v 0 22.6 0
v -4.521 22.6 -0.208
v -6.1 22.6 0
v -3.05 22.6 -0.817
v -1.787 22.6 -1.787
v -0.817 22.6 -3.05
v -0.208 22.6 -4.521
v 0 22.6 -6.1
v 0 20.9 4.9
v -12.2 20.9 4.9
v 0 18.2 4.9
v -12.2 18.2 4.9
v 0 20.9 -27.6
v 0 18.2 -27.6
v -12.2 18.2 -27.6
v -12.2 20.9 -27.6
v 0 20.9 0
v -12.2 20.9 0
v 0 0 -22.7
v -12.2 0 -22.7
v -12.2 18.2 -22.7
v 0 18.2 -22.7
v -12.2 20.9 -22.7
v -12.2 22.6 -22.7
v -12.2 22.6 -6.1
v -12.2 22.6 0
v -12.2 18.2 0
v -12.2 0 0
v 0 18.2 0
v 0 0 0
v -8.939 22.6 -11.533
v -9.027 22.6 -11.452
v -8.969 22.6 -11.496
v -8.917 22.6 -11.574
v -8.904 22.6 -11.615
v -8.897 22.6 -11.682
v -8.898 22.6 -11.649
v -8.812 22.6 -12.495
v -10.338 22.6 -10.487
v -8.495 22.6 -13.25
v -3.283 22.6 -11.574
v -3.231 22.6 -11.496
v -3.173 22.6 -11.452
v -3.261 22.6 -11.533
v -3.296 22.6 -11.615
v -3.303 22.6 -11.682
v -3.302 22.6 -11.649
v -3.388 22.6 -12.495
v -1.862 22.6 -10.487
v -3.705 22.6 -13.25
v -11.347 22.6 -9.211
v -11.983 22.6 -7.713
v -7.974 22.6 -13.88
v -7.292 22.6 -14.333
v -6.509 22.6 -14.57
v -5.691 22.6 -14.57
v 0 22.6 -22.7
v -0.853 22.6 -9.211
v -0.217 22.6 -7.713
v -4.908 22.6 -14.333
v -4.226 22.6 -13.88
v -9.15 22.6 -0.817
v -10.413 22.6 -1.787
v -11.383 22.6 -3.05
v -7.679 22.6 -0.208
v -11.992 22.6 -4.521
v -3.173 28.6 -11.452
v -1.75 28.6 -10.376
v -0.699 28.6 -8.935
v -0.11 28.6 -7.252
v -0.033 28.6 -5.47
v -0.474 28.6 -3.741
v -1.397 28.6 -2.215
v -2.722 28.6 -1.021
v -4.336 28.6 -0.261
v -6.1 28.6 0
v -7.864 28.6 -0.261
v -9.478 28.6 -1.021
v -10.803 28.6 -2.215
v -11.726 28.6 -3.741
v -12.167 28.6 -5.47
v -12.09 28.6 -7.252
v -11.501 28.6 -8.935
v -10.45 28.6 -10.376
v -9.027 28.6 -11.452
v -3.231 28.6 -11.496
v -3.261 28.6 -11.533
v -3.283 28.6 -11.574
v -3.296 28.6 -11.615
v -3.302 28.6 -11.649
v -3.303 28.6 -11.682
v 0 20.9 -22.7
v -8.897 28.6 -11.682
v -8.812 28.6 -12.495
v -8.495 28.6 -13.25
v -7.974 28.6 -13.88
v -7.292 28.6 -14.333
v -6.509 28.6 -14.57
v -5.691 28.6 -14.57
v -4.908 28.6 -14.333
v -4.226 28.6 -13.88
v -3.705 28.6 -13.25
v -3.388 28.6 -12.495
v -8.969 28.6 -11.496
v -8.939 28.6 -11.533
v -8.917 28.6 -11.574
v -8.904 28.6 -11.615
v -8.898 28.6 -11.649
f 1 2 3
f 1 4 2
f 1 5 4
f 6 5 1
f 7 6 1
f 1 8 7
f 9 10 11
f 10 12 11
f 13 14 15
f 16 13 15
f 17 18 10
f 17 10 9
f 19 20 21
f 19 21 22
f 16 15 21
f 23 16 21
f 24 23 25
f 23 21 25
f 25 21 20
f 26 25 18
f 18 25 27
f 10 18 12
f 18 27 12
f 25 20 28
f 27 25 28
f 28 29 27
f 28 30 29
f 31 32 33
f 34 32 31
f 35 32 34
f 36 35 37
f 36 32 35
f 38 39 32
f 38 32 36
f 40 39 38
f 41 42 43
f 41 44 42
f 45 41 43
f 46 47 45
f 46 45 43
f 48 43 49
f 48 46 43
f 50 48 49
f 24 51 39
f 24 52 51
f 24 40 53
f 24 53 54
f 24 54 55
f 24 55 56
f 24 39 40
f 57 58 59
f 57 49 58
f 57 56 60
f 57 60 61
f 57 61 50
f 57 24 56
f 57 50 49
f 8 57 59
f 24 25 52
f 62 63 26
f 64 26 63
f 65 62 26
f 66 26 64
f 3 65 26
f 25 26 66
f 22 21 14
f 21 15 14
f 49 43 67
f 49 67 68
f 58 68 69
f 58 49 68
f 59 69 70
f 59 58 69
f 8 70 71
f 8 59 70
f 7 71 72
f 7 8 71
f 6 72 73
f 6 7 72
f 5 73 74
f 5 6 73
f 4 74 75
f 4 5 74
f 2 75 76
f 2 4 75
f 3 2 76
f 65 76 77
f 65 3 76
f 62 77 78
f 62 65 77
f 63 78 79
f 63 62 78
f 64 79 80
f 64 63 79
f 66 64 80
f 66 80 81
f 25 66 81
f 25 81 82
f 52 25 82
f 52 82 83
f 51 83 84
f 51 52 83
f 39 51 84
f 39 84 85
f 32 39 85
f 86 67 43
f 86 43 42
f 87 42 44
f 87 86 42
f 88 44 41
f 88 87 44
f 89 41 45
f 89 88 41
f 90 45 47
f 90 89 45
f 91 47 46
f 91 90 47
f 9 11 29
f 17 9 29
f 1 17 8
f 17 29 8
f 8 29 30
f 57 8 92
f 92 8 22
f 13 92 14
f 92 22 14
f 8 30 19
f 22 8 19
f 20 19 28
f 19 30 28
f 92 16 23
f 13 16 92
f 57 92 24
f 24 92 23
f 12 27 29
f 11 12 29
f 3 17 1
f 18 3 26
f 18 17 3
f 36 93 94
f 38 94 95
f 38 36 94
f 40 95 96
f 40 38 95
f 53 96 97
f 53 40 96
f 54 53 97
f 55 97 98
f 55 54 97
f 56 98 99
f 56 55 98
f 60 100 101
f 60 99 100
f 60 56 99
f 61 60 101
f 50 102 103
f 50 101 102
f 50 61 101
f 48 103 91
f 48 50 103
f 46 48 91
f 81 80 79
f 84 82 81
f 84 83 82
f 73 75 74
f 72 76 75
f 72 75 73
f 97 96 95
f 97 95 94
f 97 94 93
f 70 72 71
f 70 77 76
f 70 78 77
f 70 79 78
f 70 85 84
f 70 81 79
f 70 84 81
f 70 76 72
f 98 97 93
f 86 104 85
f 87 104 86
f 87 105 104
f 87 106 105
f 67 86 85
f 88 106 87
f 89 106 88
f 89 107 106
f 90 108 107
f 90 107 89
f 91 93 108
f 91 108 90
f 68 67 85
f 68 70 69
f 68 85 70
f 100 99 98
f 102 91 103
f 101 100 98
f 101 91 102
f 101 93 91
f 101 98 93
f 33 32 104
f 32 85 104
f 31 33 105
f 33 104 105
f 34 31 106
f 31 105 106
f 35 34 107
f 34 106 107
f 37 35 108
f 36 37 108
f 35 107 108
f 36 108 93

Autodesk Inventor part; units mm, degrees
ref_plane "YZ Plane" through (0, 0, 0) normal (1, 0, 0) x (0, 1, 0)
ref_plane "XZ Plane" through (0, 0, 0) normal (0, 1, 0) x (-1, 0, 0)
ref_plane "XY Plane" through (0, 0, 0) normal (0, 0, 1) x (1, 0, 0)
sketch "Sketch1" plane through (0, 0, 0) normal (0, 1, 0) x (-1, 0, 0)
  line L0 (0, 0) -> (12.2, 0)
  line L1 (12.2, 0) -> (12.2, -22.7)
  line L2 (12.2, -22.7) -> (0, -22.7)
  line L3 (0, -22.7) -> (0, 0)
  dimension "d0" = 12.2
  dimension "d1" = 22.7
extrude "Extrusion1" add sketch "Sketch1" along normal blind 18.2
sketch "Sketch2" plane through (0, 18.2, 0) normal (0, 1, 0) x (1, 0, 0)
  line L0 (-12.2, -4.9) -> (0, -4.9)
  line L1 (0, -4.9) -> (0, 27.6)
  line L2 (0, 27.6) -> (-12.2, 27.6)
  line L3 (-12.2, 27.6) -> (-12.2, -4.9)
  line L4 (-12.2, -4.9) -> (0, 27.6) construction
  line L5 (0, -4.9) -> (-12.2, 27.6) construction
  line L6 (-12.2, 0) -> (0, 0) projected
  line L7 (-12.2, 22.7) -> (-12.2, 0) projected
  point P0 (-6.1, 11.35)
  dimension "d4" = 32.5
  dimension "d5" = 12.2
  dimension "d6" = 11.35
  dimension "d7" = 6.1
extrude "Extrusion2" add sketch "Sketch2" along normal blind 2.7
sketch "Sketch3" plane through (0, 20.9, 0) normal (0, 1, 0) x (1, 0, 0)
  line L0 (0, 22.7) -> (-12.2, 22.7) projected
  line L1 (0, 0) -> (-12.2, 0)
  line L2 (-12.2, 0) -> (-12.2, 22.7)
  line L3 (-12.2, 22.7) -> (0, 22.7)
  line L4 (0, 22.7) -> (0, 0)
extrude "Extrusion3" add sketch "Sketch3" along normal blind 1.7
sketch "Sketch5" plane through (0, 22.6, 0) normal (0, 1, 0) x (1, 0, 0)
  circle A0 centre (-6.1, 6.1) radius 6.1
  line L0 (-12.2, 22.7) -> (-12.2, 0) projected
  line L1 (0, 0) -> (0, 22.7) projected
  line L2 (-12.2, 0) -> (0, 0) projected
  circle A1 centre (-6.1, 11.8) radius 2.8
  point P0 (-8.8866, 11.5263)
  point P1 (-3.3134, 11.5263)
  dimension "d12" = 6.1
  dimension "d13" = 5.6
  dimension "d14" = 14.6
extrude "Extrusion4" add sketch "Sketch5" along normal blind 6 contours A0 A1 | A1 A0 | A0 A1
fillet "Fillet1" radius 0.25 2 edges at (-8.8866, 25.6, -11.5263) (-3.3134, 25.6, -11.5263)
properties part number "Servo"
